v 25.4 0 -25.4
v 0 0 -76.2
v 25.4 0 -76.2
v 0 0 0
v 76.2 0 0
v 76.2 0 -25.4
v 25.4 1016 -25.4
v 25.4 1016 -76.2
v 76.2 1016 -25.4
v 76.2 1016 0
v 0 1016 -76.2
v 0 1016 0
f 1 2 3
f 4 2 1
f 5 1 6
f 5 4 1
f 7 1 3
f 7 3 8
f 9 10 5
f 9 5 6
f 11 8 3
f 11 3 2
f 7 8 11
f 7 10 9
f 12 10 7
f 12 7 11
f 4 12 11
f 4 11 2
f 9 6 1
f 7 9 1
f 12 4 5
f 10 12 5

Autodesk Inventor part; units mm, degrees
ref_plane "YZ Plane" through (0, 0, 0) normal (1, 0, 0) x (0, 1, 0)
ref_plane "XZ Plane" through (0, 0, 0) normal (0, 1, 0) x (-1, 0, 0)
ref_plane "XY Plane" through (0, 0, 0) normal (0, 0, 1) x (1, 0, 0)
sketch "Sketch1" plane through (0, 0, 0) normal (0, 1, 0) x (-1, 0, 0)
  line L0 (0, 0) -> (-25.4, 0)
  line L1 (-25.4, 0) -> (-25.4, -25.4)
  line L2 (-25.4, -25.4) -> (0, -25.4)
  line L3 (0, -25.4) -> (0, 0)
  dimension "d0" = 25.4
  dimension "d1" = 25.4
extrude "Extrusion1" add sketch "Sketch1" along normal blind 1016
sketch "Sketch2" plane through (25.4, 0, 0) normal (1, 0, 0) x (0, 0, -1)
  line L0 (0, 0) -> (25.4, 0) projected
  line L1 (0, 1016) -> (25.4, 1016)
  line L2 (25.4, 1016) -> (25.4, 0)
  line L3 (25.4, 0) -> (0, 0)
  line L4 (0, 0) -> (0, 1016)
extrude "Extrusion2" add sketch "Sketch2" along normal blind 50.8
sketch "Sketch4" plane through (0, 0, -25.4) normal (0, 0, -1) x (-1, 0, 0)
  line L0 (0, 0) -> (-76.2, 0) projected
  line L1 (0, 0) -> (-25.4, 0)
  line L2 (-25.4, 0) -> (-25.4, 1016)
  line L3 (-25.4, 1016) -> (0, 1016)
  line L4 (0, 1016) -> (0, 0)
  dimension "d8" = 25.4
  dimension "d9" = 1016
extrude "Extrusion4" add sketch "Sketch4" along normal blind 50.8
properties part number "rev1 corners"
